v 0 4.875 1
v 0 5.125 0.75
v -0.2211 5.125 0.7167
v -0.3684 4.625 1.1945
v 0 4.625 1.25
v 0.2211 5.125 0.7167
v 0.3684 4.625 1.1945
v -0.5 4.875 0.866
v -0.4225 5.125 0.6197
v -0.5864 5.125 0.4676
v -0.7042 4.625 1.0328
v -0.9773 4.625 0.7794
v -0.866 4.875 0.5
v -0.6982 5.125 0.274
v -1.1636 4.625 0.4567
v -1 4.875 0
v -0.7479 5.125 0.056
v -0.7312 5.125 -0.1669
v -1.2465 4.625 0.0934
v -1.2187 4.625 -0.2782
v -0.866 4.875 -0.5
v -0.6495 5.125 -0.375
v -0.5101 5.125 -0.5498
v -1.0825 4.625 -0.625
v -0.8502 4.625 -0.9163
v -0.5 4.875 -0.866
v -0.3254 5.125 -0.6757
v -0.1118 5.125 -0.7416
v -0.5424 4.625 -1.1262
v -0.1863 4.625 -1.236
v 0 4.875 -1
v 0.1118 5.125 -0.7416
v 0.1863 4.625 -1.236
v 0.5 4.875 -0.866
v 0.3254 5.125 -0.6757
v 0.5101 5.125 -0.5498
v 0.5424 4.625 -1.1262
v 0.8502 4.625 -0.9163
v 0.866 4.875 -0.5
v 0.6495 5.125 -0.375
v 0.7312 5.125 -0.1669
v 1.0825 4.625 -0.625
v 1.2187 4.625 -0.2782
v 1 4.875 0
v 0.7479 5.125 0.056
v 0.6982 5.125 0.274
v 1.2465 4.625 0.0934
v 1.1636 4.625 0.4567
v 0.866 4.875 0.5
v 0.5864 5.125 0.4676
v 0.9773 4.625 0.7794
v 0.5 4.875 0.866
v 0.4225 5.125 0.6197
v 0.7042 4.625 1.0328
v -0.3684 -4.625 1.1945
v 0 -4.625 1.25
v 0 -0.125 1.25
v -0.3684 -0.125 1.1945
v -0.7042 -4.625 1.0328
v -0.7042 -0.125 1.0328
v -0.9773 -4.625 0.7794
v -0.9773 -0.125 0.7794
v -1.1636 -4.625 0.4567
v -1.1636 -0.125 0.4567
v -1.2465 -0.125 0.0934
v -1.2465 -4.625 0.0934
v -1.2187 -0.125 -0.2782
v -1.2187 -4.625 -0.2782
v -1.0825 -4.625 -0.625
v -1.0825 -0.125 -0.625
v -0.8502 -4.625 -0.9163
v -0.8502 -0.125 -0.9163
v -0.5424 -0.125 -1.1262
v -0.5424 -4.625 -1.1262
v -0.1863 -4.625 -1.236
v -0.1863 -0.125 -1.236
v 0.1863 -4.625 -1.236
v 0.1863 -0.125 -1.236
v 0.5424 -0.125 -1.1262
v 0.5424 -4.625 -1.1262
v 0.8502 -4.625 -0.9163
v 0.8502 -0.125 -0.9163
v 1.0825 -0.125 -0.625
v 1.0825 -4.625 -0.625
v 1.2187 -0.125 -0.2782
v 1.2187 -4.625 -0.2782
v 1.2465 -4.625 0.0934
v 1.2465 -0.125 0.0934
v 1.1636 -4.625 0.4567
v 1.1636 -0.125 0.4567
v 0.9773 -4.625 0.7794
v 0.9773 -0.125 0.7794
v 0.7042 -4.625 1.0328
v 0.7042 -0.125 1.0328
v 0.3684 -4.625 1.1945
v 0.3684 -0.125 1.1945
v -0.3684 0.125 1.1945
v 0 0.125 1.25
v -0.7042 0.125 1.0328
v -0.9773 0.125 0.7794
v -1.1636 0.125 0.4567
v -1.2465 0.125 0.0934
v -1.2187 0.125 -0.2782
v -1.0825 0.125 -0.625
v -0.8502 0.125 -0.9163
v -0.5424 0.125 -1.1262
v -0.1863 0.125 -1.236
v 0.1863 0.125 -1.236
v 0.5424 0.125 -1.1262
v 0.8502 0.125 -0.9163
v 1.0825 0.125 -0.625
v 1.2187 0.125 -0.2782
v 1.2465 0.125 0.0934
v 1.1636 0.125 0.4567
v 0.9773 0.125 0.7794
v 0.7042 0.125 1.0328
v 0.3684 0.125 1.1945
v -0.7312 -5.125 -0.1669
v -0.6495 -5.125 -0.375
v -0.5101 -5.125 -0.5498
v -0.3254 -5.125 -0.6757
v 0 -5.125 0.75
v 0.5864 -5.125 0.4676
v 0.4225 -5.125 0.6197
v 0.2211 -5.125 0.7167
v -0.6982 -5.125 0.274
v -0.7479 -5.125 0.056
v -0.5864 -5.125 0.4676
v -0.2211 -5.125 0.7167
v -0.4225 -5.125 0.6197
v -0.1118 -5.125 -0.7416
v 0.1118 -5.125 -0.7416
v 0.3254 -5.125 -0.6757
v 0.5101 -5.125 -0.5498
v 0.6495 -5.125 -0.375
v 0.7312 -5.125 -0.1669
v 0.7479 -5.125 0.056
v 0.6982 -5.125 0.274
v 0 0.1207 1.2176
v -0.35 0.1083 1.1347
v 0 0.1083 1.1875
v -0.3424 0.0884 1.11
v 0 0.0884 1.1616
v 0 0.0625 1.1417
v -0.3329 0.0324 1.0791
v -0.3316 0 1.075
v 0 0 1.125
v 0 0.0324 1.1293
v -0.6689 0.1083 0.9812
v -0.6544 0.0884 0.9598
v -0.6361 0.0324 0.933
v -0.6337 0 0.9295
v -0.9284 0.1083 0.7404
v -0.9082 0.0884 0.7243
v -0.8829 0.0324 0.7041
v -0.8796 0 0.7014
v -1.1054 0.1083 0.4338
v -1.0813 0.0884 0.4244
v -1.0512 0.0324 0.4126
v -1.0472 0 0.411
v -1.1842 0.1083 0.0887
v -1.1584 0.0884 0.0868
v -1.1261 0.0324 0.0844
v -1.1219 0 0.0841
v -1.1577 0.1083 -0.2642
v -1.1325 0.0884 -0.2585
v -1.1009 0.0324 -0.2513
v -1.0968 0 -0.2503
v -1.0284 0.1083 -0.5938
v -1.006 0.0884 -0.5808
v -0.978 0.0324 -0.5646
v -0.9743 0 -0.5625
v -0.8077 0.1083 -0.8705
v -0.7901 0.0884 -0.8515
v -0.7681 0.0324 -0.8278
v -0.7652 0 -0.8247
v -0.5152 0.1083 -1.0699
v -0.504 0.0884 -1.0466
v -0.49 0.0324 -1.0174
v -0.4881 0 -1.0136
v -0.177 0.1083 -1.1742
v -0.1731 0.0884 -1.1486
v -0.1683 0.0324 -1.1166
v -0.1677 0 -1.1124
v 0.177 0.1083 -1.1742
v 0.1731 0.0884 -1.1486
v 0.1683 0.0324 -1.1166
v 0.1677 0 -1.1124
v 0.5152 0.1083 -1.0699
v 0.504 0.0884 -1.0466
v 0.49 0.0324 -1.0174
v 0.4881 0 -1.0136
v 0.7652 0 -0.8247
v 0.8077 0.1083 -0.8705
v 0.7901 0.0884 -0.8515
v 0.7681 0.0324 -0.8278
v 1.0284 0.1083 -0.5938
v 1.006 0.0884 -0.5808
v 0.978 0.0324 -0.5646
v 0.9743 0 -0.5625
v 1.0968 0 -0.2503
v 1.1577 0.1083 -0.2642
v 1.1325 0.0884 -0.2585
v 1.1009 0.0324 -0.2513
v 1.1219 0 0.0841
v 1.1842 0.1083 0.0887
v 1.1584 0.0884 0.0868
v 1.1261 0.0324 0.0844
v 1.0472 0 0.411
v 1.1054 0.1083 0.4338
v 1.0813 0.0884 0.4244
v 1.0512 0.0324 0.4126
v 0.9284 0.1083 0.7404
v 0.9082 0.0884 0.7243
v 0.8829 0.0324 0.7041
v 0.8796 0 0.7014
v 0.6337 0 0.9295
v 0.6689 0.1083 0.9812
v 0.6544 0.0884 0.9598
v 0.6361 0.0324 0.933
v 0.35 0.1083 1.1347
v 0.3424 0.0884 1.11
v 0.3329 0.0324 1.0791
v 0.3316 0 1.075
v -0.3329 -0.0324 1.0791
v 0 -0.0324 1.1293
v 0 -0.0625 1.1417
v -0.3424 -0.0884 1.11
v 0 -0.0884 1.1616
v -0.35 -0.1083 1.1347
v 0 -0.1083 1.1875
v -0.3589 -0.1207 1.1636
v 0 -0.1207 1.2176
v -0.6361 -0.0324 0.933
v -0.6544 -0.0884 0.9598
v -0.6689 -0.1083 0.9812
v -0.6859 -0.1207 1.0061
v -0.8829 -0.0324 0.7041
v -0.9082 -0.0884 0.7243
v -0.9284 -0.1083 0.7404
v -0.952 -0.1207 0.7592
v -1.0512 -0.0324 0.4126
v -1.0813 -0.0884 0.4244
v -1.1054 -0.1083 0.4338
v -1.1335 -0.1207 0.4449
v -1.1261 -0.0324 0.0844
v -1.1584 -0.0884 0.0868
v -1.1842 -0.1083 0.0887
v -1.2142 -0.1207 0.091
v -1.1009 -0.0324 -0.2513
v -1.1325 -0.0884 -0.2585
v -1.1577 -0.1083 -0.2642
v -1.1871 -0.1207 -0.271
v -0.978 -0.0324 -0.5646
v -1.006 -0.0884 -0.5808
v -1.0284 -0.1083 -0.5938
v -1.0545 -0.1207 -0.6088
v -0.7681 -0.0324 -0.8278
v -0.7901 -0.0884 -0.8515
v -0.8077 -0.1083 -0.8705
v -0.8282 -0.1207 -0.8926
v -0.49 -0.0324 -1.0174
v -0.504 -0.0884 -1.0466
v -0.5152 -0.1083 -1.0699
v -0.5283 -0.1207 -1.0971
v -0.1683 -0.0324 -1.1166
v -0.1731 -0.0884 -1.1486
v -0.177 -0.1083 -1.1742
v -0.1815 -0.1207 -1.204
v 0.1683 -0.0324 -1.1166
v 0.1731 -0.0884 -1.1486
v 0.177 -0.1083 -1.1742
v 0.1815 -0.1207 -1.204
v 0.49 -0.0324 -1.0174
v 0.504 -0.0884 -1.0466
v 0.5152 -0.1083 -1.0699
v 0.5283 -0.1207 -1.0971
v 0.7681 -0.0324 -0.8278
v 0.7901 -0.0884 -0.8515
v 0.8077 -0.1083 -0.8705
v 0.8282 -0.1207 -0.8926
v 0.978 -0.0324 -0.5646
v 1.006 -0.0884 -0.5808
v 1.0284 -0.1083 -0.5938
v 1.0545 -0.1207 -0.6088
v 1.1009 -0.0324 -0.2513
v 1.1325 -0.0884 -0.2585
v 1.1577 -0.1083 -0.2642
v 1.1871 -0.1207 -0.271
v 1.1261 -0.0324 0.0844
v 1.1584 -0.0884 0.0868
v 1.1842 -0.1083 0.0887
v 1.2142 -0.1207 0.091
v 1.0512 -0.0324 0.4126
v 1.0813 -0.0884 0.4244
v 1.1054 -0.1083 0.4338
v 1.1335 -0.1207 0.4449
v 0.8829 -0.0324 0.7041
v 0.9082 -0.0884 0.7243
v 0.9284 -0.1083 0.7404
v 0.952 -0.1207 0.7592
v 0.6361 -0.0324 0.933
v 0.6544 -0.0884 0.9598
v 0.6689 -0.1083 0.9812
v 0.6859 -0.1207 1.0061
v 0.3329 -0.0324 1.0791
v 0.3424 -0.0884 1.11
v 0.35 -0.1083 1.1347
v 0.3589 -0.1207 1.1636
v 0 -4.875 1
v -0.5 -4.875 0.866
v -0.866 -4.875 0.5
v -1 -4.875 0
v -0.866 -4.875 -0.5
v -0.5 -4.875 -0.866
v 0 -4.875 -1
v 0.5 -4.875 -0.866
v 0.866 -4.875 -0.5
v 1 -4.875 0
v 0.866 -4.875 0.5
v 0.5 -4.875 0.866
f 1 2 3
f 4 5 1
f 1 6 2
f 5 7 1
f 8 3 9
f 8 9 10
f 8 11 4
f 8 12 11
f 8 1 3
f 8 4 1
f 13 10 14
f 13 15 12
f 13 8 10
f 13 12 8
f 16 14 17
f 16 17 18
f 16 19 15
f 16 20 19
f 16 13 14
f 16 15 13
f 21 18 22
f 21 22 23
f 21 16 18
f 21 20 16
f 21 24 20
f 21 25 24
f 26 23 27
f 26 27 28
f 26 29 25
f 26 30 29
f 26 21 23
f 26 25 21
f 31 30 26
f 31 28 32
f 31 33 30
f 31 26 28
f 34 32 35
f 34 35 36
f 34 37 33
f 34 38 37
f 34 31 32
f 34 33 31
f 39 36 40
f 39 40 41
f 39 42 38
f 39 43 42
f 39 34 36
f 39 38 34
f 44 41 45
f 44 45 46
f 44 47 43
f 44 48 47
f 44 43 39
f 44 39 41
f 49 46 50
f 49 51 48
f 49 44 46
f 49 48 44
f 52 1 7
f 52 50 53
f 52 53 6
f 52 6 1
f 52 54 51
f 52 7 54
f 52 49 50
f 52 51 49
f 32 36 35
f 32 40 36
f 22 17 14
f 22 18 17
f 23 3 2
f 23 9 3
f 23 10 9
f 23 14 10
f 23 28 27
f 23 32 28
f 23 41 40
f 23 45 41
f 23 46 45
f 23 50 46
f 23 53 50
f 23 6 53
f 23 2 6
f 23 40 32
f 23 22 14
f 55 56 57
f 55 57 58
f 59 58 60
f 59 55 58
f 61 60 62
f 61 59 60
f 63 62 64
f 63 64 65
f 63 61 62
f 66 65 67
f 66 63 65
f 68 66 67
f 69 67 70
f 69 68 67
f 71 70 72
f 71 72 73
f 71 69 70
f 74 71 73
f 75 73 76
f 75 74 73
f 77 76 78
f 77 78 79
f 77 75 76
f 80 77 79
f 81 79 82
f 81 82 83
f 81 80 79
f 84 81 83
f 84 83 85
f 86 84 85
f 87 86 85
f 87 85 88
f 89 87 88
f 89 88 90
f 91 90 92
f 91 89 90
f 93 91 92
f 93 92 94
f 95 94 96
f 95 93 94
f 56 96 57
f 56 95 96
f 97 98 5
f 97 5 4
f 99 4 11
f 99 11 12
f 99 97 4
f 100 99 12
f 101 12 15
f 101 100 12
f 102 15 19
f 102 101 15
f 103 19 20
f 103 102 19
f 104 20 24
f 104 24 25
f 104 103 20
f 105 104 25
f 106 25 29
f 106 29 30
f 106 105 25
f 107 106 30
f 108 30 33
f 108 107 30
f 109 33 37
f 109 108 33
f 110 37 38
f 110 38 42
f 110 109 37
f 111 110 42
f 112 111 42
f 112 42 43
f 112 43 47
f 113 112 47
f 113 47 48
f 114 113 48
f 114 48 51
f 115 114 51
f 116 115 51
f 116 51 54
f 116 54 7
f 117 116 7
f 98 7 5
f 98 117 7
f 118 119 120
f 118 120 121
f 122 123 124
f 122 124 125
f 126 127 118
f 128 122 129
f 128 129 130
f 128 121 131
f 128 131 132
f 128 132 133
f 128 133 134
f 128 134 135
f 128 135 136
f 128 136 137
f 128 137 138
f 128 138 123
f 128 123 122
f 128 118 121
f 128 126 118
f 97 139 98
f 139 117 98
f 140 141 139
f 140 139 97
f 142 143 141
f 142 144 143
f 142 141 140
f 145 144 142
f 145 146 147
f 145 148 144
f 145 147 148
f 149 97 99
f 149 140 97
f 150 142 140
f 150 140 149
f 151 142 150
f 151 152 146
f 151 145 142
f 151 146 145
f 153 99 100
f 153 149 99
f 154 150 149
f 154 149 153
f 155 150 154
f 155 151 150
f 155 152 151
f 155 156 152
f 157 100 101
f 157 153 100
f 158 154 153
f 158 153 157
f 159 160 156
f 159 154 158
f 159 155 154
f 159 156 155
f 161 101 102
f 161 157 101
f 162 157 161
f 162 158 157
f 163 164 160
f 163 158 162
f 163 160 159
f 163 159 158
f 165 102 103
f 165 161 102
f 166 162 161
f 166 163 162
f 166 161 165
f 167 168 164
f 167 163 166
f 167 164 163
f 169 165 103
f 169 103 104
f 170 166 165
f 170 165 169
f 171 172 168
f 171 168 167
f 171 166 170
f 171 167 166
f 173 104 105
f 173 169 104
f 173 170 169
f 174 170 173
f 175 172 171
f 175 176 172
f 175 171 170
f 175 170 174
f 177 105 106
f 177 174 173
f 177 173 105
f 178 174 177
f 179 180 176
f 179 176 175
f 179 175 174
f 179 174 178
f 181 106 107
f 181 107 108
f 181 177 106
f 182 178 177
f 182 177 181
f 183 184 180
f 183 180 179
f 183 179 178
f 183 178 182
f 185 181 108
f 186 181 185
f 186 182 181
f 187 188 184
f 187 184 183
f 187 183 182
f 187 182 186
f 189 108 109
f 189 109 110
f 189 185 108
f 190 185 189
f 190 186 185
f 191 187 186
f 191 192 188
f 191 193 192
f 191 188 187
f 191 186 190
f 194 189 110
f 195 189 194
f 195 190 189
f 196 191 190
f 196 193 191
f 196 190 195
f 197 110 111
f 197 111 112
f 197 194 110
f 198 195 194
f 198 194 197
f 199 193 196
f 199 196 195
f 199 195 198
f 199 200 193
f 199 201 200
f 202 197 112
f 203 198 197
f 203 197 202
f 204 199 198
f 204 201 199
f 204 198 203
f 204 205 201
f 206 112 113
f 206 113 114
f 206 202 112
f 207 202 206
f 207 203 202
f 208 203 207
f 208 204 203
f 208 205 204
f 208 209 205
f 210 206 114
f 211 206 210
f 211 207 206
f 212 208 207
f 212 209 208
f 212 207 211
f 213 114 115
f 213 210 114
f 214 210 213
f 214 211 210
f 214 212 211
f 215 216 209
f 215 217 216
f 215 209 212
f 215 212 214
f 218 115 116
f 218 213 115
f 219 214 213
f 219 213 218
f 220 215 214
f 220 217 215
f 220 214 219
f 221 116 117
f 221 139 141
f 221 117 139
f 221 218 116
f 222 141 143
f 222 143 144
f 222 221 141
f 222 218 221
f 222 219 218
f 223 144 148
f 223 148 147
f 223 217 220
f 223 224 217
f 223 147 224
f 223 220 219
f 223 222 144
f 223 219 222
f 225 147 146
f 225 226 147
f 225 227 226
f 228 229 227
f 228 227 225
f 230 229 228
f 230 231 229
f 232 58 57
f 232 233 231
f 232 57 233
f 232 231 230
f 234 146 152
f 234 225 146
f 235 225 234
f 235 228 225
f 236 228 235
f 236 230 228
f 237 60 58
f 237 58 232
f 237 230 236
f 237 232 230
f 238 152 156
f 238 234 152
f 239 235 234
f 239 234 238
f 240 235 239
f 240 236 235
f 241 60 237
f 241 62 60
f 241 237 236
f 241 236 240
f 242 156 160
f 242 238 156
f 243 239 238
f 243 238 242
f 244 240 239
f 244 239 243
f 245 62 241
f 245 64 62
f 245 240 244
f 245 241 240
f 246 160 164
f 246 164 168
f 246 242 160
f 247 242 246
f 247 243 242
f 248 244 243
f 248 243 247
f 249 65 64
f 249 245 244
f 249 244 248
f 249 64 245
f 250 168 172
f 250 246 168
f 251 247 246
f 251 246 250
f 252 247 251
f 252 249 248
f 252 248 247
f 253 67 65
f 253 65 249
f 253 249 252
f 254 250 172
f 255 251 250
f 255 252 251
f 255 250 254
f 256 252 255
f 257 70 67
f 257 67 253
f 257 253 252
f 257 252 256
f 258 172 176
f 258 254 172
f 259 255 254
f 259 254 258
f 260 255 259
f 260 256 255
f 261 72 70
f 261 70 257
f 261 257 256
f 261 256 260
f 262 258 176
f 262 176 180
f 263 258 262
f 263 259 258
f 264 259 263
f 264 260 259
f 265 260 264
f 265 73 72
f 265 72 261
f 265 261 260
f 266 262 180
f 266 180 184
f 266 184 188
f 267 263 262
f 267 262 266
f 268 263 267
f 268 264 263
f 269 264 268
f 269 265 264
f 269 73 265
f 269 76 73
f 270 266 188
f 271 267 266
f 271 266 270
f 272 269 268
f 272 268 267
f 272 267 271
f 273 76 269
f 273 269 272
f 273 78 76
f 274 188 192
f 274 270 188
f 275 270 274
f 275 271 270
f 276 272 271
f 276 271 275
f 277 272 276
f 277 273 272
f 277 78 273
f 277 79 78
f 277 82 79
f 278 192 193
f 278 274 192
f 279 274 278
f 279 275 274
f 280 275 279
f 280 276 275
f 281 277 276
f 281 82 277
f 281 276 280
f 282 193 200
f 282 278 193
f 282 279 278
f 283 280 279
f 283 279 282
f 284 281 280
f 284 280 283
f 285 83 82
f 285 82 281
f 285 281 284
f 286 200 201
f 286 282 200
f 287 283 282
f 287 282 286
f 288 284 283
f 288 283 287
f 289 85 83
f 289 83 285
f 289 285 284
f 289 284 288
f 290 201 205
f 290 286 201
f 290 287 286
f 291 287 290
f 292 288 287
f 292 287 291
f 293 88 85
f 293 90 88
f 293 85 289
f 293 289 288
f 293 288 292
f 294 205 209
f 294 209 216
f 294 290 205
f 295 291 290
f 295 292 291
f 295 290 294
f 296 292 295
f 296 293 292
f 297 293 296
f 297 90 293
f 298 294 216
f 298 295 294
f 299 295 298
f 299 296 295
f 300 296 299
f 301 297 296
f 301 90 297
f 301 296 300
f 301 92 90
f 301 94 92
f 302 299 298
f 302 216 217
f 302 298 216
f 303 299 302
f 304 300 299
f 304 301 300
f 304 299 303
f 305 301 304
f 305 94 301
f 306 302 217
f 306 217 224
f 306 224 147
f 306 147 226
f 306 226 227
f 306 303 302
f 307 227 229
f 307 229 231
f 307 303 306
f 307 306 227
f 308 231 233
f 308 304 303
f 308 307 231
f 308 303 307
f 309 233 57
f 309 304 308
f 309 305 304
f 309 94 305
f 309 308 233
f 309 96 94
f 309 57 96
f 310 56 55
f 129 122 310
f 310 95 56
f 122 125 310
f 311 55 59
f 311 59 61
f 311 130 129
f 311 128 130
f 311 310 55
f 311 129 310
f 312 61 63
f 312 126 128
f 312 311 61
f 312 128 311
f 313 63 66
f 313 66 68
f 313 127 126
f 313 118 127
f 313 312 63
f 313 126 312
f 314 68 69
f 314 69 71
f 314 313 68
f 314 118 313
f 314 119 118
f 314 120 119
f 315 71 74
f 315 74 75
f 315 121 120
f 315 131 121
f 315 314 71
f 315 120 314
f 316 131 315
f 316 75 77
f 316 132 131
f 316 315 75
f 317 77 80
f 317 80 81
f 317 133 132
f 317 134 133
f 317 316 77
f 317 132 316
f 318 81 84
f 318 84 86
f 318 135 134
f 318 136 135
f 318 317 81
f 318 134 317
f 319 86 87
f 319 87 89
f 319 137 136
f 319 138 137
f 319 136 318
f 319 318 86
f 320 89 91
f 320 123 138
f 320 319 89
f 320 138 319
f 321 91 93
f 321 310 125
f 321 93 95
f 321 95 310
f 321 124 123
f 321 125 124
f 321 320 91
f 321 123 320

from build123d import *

# Parameters (mm, degrees)
F2_SIZE = 0.5


with BuildPart() as f1:
    # F0 (on Right) → F1 (revolve)
    with BuildSketch(Plane.YZ):
        with BuildLine():
            Line((-5.125, 0), (0, 0))
            Line((0, 0), (0, 1.125))
            ThreePointArc((0, 1.125), (-0.088388, 1.161612), (-0.125, 1.25))
            Line((-0.125, 1.25), (-5.125, 1.25))
            Line((-5.125, 1.25), (-5.125, 0))
        make_face()
        with BuildLine():
            Line((0, 1.125), (0, 0))
            Line((0, 0), (5.125, 0))
            Line((5.125, 0), (5.125, 1.25))
            Line((5.125, 1.25), (0.125, 1.25))
            ThreePointArc((0.125, 1.25), (0.088388, 1.161612), (0, 1.125))
        make_face()
    revolve(axis=Axis((0, 2.5625, 0), (0, -1, 0)))

    # F2
    f2_edges = [f1.edges().sort_by_distance(p)[0] for p in [
        (0, -5.125, -1.25),
        (0, 5.125, -1.25),
    ]]
    chamfer(f2_edges, length=F2_SIZE)


solid = f1.part
